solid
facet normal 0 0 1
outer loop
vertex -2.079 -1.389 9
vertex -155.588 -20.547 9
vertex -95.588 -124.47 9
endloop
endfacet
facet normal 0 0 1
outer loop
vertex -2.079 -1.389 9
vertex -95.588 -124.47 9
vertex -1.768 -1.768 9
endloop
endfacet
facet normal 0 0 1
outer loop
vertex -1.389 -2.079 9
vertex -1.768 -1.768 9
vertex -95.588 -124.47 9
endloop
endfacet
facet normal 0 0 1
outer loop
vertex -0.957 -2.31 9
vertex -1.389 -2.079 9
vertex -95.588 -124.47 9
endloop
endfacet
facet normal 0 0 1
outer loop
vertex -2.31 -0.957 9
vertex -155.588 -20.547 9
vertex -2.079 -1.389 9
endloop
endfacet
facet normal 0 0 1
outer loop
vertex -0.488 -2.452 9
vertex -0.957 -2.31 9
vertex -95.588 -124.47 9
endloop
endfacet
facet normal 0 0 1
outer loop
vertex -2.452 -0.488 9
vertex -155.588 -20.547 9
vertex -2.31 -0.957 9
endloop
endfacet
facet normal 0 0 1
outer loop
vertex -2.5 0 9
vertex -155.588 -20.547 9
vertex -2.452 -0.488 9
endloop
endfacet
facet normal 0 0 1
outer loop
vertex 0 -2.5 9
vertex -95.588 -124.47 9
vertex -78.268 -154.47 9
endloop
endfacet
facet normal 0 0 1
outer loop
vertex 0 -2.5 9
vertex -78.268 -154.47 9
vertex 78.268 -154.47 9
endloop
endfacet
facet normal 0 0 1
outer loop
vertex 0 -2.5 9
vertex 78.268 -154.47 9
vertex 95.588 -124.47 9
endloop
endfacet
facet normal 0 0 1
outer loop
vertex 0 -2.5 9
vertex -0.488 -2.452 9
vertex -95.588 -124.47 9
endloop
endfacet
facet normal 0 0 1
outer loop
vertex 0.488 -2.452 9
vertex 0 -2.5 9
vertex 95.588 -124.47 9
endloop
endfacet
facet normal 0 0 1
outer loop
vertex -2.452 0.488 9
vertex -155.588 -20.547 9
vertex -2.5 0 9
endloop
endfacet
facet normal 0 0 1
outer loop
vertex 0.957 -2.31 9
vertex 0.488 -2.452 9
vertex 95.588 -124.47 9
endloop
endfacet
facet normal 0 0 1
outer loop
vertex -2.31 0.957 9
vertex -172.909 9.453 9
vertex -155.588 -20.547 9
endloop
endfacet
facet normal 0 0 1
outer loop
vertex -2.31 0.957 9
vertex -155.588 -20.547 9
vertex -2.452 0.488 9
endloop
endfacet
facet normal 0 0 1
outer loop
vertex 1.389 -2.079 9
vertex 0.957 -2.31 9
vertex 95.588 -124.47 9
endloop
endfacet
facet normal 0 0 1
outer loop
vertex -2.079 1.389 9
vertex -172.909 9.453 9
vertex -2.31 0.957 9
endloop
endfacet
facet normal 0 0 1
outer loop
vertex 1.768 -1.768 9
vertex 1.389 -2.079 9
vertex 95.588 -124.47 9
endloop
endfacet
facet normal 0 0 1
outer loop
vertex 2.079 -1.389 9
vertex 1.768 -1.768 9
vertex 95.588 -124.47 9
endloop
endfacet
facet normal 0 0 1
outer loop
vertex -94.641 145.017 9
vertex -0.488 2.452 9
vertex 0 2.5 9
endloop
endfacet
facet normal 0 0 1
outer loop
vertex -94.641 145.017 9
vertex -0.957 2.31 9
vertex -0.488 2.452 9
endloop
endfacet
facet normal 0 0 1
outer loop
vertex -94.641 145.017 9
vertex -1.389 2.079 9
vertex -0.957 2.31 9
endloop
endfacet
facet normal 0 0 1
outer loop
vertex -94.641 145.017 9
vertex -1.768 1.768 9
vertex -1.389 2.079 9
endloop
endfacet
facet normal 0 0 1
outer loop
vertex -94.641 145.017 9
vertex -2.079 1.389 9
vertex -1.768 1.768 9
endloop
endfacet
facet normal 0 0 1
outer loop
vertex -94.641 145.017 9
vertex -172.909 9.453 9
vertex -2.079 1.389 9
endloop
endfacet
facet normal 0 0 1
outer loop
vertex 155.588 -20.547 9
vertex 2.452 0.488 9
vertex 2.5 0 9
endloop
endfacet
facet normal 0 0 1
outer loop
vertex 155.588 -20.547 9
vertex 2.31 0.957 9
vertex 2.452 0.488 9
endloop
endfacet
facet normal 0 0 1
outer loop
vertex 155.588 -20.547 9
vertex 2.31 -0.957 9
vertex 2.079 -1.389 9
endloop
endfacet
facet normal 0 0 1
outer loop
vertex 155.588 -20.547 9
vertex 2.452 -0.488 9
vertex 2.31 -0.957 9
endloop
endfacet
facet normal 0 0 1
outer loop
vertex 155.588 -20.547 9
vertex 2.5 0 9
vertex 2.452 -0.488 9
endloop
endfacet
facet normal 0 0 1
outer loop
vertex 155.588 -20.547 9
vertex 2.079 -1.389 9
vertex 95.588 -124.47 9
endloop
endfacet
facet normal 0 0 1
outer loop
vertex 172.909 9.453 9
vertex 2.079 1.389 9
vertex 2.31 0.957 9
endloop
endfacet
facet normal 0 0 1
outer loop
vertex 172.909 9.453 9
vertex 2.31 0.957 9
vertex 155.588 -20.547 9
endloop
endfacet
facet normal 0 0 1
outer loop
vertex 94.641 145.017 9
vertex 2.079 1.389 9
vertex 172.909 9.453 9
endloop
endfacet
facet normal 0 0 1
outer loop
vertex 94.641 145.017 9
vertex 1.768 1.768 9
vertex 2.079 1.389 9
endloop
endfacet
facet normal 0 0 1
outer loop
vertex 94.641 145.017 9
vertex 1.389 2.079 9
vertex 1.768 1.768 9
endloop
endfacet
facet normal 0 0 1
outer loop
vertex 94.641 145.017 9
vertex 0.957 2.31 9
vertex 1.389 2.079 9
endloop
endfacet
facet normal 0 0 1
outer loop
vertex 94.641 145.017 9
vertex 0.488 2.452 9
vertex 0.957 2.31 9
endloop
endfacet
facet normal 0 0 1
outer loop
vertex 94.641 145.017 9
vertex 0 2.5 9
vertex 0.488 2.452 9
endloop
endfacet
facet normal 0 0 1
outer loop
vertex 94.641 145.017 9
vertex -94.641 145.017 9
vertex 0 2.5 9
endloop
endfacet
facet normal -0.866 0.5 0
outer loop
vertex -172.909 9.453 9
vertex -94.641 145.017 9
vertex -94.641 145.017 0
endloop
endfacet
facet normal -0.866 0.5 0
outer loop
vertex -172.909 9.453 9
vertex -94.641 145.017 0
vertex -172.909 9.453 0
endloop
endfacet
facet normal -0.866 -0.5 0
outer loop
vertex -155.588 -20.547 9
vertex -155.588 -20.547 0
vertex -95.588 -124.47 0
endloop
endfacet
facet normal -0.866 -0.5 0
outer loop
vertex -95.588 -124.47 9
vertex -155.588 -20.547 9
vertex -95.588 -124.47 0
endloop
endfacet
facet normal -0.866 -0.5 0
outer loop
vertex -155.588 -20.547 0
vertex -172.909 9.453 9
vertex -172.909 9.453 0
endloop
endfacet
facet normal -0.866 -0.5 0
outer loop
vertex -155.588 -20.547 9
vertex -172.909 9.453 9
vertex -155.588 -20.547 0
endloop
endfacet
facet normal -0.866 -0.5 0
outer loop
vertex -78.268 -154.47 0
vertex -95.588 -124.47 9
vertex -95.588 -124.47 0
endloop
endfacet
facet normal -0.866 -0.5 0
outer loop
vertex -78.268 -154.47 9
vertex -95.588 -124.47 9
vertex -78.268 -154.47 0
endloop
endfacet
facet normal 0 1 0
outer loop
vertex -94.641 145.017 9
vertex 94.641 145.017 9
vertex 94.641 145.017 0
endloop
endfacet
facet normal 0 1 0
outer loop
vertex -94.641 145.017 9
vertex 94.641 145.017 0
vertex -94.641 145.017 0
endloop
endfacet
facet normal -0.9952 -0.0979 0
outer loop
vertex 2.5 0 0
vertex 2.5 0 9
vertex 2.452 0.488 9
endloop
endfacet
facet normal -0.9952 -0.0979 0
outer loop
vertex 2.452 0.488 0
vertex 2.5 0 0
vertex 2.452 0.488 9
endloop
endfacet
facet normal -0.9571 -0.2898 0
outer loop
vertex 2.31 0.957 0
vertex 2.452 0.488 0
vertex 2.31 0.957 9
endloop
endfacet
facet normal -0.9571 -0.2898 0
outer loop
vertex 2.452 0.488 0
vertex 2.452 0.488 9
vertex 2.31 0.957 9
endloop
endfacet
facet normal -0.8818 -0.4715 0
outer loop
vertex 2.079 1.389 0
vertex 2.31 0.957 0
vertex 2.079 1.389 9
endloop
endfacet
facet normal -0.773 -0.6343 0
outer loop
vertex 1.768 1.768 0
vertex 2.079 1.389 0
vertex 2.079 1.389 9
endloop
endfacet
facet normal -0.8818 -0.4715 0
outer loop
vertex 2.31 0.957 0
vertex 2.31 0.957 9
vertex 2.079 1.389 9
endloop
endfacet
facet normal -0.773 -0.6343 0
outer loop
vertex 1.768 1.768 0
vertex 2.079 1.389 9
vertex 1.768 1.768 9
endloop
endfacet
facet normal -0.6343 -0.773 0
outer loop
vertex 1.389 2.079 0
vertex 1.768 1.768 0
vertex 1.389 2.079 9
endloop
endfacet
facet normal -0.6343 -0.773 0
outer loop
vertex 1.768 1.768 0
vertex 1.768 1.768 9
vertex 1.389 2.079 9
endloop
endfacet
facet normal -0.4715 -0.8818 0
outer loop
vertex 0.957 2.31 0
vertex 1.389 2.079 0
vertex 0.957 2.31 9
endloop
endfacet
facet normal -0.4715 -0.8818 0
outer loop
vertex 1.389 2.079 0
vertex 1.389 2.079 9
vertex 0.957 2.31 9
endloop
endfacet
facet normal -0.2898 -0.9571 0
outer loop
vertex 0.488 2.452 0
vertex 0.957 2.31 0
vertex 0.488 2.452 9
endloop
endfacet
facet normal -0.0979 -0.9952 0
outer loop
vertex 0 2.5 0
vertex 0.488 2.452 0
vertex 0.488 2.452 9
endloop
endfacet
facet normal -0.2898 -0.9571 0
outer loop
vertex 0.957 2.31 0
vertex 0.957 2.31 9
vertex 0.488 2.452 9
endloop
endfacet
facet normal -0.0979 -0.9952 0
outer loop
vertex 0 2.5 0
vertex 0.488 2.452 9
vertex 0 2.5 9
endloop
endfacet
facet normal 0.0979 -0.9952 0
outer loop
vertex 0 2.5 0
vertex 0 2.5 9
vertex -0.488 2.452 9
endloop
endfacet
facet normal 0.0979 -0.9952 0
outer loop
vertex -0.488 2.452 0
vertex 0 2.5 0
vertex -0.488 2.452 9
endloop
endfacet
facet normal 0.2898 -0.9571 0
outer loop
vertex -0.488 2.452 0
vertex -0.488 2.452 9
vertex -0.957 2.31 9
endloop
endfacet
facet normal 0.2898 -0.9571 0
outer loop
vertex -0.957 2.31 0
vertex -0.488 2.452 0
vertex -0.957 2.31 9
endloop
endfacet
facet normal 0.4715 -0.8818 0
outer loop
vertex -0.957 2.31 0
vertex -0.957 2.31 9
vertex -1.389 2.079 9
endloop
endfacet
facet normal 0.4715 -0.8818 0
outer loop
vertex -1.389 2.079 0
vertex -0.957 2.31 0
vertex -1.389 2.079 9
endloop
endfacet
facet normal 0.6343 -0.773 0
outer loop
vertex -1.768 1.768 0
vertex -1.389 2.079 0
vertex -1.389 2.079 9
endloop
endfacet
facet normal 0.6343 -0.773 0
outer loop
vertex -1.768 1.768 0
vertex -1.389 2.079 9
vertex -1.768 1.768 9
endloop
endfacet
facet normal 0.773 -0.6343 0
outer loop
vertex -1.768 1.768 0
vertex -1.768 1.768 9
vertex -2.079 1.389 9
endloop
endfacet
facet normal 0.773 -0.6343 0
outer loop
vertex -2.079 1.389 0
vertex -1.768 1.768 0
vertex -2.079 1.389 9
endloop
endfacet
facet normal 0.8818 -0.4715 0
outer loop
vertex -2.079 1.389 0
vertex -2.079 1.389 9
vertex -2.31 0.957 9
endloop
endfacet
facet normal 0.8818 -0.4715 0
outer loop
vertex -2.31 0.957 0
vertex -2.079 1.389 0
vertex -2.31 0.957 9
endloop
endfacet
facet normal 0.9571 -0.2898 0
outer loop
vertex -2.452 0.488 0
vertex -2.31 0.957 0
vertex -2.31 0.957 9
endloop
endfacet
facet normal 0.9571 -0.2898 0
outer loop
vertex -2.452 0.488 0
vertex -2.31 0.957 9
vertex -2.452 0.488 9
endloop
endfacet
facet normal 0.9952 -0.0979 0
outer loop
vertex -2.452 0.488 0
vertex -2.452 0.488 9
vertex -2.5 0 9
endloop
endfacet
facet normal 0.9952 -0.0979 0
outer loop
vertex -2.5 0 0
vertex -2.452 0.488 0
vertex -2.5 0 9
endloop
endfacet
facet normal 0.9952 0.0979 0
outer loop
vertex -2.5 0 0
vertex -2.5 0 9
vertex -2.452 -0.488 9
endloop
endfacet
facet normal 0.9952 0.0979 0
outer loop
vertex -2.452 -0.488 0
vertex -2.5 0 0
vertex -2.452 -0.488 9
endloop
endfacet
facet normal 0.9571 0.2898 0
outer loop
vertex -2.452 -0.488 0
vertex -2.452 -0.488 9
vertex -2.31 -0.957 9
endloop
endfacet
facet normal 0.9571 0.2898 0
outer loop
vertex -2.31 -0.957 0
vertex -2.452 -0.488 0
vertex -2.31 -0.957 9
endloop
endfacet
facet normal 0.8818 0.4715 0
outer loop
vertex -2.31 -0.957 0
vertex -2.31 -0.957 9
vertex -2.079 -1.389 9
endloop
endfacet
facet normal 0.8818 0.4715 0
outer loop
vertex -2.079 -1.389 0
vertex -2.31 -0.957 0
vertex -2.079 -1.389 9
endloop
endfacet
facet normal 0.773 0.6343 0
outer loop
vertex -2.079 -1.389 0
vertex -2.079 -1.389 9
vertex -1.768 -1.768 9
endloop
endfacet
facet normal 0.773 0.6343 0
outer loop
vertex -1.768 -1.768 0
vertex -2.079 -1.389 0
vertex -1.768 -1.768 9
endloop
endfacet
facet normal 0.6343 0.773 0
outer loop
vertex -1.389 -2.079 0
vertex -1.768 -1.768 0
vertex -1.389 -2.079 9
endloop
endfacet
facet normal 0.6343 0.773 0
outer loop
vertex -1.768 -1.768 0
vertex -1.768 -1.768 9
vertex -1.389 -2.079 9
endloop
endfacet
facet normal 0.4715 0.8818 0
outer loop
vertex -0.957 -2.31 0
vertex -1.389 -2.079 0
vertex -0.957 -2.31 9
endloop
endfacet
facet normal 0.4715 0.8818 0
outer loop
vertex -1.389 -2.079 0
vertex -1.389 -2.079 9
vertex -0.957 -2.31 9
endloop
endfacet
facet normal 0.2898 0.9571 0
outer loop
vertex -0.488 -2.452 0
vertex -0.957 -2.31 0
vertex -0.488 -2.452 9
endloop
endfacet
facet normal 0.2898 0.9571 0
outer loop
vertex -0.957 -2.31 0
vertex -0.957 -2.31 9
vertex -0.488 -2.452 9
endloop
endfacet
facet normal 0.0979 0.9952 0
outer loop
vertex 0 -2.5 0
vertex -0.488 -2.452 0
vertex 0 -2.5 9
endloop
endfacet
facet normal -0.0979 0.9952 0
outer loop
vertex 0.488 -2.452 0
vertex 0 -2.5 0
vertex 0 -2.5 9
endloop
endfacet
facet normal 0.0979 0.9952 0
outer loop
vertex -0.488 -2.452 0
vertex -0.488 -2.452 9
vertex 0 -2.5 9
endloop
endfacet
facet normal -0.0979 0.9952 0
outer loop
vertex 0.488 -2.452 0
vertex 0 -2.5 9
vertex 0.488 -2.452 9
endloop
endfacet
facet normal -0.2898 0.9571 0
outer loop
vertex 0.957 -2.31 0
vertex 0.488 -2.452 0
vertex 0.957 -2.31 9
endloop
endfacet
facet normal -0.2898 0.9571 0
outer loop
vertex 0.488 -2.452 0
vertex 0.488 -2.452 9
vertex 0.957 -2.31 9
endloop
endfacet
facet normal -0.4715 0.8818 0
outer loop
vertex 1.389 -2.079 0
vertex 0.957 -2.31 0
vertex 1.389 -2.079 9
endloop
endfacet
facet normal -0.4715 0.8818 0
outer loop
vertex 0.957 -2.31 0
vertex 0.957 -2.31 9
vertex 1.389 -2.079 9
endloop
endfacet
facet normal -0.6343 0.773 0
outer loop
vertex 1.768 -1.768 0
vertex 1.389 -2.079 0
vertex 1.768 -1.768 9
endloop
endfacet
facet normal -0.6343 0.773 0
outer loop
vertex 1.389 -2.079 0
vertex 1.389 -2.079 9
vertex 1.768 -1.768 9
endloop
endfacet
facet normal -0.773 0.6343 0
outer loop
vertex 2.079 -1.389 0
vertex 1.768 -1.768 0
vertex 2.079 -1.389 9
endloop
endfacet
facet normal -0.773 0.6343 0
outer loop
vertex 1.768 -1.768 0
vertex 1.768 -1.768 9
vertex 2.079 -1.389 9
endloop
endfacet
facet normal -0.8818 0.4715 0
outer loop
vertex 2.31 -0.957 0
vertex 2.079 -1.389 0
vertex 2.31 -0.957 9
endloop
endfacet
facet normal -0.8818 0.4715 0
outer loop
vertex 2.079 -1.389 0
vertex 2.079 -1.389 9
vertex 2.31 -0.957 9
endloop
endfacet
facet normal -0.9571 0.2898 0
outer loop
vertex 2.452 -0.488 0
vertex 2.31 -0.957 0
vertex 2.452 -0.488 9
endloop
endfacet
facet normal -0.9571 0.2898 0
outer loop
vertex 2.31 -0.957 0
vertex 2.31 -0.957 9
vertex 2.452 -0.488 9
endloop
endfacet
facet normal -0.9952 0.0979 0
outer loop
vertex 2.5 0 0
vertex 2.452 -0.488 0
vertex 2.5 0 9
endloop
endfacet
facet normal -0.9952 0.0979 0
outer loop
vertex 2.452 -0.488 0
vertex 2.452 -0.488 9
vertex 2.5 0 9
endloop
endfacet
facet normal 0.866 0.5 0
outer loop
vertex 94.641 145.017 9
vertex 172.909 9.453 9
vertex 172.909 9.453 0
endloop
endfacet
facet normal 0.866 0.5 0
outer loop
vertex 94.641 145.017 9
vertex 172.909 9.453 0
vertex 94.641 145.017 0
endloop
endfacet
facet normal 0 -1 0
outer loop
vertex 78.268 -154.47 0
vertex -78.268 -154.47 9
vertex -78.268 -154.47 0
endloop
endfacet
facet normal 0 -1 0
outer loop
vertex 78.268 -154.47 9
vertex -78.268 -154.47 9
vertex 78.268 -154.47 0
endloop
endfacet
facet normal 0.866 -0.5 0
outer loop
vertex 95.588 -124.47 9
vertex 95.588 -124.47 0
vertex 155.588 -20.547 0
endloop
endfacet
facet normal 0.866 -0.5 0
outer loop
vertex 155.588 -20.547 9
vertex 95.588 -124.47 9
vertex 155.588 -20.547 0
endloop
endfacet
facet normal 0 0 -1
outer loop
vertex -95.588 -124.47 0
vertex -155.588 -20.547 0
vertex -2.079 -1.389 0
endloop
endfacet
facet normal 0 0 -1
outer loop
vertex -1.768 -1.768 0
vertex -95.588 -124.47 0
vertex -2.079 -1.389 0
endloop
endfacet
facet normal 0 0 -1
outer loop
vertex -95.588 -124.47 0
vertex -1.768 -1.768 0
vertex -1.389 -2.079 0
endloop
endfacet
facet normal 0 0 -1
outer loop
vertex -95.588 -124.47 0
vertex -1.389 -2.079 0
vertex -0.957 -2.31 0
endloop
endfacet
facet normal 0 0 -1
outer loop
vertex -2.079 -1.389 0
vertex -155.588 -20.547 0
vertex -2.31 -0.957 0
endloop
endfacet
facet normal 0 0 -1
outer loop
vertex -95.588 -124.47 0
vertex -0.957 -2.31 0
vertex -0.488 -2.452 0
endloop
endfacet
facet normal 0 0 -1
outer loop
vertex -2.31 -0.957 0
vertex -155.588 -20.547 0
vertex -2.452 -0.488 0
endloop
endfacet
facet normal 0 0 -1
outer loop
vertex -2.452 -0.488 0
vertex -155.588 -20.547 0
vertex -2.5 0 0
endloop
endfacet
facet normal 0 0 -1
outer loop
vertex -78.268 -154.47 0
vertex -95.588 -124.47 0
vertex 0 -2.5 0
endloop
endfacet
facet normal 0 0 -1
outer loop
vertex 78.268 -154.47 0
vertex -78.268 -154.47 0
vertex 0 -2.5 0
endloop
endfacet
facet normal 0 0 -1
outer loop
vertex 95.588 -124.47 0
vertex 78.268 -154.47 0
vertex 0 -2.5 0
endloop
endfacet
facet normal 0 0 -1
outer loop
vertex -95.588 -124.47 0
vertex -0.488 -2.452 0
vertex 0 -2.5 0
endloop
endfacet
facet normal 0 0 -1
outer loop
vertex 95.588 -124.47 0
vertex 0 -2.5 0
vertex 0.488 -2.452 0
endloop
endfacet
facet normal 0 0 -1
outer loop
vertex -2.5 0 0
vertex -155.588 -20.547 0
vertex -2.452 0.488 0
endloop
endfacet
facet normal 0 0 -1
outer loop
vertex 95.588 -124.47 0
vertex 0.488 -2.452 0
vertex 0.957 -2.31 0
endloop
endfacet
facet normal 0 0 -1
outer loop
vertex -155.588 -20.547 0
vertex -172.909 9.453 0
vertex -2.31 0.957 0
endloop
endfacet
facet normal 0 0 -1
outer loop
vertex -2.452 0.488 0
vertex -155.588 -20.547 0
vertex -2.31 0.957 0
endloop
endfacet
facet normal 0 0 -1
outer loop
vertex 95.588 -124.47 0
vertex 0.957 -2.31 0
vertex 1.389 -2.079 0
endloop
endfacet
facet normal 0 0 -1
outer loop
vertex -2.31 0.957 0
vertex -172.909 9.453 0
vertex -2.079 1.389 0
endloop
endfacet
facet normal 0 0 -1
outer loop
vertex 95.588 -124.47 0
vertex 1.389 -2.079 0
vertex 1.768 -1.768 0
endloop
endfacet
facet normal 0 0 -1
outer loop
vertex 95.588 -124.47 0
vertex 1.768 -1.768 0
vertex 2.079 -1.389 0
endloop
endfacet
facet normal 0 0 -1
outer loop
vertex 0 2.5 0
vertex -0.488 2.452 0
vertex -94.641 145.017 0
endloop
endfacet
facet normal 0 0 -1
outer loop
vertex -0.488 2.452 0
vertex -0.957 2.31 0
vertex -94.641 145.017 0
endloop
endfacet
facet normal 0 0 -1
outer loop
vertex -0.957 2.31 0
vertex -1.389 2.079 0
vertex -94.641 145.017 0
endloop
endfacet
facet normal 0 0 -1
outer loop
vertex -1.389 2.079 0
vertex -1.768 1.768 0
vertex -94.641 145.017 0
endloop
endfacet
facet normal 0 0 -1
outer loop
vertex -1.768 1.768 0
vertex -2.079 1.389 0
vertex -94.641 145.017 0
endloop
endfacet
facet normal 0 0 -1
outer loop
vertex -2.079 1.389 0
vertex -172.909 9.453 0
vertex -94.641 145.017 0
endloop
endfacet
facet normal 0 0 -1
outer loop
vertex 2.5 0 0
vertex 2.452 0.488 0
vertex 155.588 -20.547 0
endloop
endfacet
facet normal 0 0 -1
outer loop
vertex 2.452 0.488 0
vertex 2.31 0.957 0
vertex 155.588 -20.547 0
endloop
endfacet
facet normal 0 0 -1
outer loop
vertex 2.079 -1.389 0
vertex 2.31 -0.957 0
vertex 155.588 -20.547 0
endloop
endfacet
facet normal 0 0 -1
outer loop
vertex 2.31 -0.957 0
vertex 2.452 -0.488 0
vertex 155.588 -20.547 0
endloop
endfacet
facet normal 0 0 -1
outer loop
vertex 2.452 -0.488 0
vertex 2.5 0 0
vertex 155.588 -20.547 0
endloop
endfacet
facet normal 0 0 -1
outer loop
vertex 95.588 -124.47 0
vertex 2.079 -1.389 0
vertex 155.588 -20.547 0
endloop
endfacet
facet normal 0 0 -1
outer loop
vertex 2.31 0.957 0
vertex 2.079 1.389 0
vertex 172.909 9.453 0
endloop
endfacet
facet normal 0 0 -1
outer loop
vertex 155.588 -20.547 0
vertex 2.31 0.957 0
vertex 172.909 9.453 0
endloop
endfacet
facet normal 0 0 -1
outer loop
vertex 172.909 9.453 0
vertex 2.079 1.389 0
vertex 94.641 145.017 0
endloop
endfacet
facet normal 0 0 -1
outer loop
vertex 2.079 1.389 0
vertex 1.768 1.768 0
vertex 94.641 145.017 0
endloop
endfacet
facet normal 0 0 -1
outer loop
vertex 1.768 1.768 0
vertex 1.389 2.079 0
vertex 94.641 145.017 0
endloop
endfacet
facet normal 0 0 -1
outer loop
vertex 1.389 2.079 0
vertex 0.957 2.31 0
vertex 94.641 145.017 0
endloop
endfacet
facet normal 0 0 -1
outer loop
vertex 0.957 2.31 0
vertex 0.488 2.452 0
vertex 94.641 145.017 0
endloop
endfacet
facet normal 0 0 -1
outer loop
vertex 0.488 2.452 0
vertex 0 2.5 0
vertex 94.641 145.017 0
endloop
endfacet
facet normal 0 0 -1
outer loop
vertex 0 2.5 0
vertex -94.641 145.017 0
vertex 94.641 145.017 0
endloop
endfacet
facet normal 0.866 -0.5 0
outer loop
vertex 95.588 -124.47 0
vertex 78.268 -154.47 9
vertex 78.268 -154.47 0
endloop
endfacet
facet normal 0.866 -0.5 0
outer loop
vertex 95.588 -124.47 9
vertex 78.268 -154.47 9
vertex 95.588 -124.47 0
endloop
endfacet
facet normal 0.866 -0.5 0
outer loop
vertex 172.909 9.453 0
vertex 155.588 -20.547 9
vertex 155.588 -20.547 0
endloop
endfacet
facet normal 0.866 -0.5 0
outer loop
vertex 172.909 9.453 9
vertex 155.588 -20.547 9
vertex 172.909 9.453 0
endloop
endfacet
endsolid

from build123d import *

# Parameters (mm, degrees)
F1_DEPTH = 9
F3_DEPTH = 9
F4_R     = 2.5
F5_DEPTH = 25


with BuildPart() as f1:
    # F0 (on Top) → F1 (new body)
    with BuildSketch(Plane.XY):
        Polygon((60, 145.017109), (-60, 145.017109), (-155.5885, -20.54703), (-95.5885, -124.470079), (95.5885, -124.470079), (155.5885, -20.54703), align=None)
    extrude(amount=F1_DEPTH)

    # F2 (on face) → F3 (join)
    with BuildSketch(Plane.XY.offset(9)):
        Polygon((-94.641016, 145.017109), (-172.909008, 9.45297), (-155.5885, -20.54703), (-60, 145.017109), align=None)
        Polygon((94.641016, 145.017109), (60, 145.017109), (155.5885, -20.54703), (172.909008, 9.45297), align=None)
        Polygon((95.5885, -124.470079), (-95.5885, -124.470079), (-78.267992, -154.470079), (78.267992, -154.470079), align=None)
    extrude(amount=-F3_DEPTH)

    # F4 (on face) → F5 (cut)
    with BuildSketch(Plane.XY.offset(9)):
        Circle(F4_R)
    extrude(amount=-F5_DEPTH, mode=Mode.SUBTRACT)


solid = f1.part
